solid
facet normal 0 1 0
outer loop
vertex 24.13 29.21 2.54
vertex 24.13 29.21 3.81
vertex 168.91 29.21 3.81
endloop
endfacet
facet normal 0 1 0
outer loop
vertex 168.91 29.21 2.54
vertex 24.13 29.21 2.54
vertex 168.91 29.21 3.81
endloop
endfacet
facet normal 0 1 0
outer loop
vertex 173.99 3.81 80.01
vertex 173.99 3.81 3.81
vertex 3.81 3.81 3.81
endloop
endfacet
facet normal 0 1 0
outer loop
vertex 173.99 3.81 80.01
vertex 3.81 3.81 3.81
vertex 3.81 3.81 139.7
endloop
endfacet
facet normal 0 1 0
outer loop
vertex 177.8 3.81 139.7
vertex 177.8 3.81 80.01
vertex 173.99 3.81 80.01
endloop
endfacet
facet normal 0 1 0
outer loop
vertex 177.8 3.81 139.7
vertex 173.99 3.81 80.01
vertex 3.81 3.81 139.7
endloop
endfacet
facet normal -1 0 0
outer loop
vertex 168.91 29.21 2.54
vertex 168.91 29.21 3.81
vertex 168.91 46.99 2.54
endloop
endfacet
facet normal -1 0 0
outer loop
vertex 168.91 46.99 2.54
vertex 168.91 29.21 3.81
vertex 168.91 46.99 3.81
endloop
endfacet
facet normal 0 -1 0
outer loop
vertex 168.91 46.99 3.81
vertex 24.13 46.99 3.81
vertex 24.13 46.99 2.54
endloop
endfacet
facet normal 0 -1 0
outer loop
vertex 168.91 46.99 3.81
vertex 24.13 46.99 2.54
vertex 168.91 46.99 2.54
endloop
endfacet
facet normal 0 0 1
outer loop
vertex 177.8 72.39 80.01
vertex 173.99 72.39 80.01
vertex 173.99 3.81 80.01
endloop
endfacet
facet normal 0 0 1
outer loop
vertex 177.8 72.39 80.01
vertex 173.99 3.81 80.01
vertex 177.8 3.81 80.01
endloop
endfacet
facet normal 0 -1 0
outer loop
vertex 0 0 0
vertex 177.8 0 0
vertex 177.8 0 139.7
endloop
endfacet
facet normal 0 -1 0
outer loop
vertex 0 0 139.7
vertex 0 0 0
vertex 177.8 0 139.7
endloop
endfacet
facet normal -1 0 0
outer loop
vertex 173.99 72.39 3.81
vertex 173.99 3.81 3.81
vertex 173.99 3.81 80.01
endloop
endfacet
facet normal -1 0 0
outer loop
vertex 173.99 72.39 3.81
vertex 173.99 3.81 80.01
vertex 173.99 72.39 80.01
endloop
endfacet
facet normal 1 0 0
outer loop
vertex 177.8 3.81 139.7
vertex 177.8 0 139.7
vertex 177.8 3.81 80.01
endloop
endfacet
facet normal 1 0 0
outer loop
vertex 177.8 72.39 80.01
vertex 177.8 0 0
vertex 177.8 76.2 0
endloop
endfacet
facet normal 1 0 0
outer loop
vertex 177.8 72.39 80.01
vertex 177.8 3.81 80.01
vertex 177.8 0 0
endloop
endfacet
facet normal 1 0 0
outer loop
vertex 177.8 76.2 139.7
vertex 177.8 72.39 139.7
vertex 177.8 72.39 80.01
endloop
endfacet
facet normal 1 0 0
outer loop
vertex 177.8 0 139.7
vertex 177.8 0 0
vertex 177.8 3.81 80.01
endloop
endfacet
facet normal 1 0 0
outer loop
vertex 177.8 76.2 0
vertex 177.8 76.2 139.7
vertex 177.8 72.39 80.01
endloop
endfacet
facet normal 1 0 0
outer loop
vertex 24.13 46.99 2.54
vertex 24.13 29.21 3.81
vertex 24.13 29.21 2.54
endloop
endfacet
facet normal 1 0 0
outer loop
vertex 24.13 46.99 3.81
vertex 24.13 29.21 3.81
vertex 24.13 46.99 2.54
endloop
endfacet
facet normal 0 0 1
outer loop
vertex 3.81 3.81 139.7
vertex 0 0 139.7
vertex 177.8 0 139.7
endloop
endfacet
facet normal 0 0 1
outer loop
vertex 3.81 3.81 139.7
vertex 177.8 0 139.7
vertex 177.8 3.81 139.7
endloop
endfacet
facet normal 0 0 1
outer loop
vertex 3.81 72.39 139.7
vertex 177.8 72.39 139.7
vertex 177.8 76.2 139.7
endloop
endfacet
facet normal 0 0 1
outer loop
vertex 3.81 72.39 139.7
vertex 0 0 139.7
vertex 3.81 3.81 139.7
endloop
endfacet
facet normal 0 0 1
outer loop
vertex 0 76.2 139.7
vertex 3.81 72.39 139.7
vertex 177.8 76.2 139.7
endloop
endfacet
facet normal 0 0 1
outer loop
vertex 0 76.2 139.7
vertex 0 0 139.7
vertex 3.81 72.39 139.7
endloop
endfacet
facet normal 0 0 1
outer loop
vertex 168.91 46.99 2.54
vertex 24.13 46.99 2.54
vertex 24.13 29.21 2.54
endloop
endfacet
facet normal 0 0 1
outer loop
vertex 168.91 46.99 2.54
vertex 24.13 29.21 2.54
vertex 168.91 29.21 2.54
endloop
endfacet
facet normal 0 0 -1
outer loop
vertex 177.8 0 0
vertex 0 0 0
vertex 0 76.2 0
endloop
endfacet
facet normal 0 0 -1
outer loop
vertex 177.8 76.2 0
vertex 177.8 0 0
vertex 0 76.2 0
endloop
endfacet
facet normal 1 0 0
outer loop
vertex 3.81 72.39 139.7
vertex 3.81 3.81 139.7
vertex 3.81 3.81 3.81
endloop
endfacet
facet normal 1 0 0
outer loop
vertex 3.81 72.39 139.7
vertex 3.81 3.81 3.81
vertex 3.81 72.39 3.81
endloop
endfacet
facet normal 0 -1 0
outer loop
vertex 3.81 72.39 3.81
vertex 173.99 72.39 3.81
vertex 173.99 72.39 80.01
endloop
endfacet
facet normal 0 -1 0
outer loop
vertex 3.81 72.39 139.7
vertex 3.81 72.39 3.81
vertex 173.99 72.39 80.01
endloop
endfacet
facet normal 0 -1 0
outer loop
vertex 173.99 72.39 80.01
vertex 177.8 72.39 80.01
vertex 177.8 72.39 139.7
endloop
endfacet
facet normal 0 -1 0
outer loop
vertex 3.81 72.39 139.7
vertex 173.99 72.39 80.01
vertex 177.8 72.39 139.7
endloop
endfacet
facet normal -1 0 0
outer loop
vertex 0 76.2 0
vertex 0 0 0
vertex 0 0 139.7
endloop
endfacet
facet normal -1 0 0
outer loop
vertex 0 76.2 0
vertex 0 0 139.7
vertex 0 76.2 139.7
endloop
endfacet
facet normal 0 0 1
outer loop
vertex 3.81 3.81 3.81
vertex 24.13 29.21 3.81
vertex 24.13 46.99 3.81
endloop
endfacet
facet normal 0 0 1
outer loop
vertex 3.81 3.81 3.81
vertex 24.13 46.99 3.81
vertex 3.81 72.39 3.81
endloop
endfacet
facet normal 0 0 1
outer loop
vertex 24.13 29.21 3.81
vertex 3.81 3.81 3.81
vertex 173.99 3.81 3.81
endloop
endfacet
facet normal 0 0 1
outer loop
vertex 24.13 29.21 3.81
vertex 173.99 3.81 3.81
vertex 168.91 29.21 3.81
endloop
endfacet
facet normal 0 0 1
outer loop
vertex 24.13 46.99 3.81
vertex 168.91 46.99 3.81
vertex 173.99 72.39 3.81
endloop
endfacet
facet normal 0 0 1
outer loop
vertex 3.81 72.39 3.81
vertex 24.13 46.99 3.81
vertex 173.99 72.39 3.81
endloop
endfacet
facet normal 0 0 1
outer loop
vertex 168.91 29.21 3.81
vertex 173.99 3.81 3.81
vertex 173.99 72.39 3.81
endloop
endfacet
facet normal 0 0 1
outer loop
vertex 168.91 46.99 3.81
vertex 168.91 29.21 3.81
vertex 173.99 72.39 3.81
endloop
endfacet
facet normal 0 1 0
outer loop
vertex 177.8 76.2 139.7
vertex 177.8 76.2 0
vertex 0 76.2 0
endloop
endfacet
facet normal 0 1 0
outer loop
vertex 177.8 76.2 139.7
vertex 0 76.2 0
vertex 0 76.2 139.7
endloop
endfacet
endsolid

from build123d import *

# Parameters (mm, degrees)
SKETCH1_W           = 76.2
SKETCH1_H           = 139.7
BOSS_EXTRUDE1_DEPTH = 177.8
SKETCH2_W           = 68.58
SKETCH2_H           = 135.89
CUT_EXTRUDE1_DEPTH  = 173.99
SKETCH3_W           = 144.78
SKETCH3_H           = 17.78
CUT_EXTRUDE2_DEPTH  = 1.27
SKETCH5_W           = 3.81
SKETCH5_H           = 68.58
BOSS_EXTRUDE2_DEPTH = 76.2


with BuildPart() as part:
    # Sketch1 → Boss-Extrude1 (new body)
    with BuildSketch(Plane.YZ):
        with Locations((38.1, 69.85)):
            Rectangle(SKETCH1_W, SKETCH1_H)
    extrude(amount=BOSS_EXTRUDE1_DEPTH)

    # Sketch2 → Cut-Extrude1 (cut)
    with BuildSketch(Plane.YZ.offset(177.8)):
        with Locations((38.1, 71.755)):
            Rectangle(SKETCH2_W, SKETCH2_H)
    extrude(amount=-CUT_EXTRUDE1_DEPTH, mode=Mode.SUBTRACT)

    # Sketch3 → Cut-Extrude2 (cut)
    with BuildSketch(Plane.XY.offset(3.81)):
        with Locations((96.52, 38.1)):
            Rectangle(SKETCH3_W, SKETCH3_H)
    extrude(amount=-CUT_EXTRUDE2_DEPTH, mode=Mode.SUBTRACT)

    # Sketch5 → Boss-Extrude2 (add)
    with BuildSketch(Plane.XY.offset(3.81)):
        with Locations((175.895, 38.1)):
            Rectangle(SKETCH5_W, SKETCH5_H)
    extrude(amount=BOSS_EXTRUDE2_DEPTH)


solid = part.part
